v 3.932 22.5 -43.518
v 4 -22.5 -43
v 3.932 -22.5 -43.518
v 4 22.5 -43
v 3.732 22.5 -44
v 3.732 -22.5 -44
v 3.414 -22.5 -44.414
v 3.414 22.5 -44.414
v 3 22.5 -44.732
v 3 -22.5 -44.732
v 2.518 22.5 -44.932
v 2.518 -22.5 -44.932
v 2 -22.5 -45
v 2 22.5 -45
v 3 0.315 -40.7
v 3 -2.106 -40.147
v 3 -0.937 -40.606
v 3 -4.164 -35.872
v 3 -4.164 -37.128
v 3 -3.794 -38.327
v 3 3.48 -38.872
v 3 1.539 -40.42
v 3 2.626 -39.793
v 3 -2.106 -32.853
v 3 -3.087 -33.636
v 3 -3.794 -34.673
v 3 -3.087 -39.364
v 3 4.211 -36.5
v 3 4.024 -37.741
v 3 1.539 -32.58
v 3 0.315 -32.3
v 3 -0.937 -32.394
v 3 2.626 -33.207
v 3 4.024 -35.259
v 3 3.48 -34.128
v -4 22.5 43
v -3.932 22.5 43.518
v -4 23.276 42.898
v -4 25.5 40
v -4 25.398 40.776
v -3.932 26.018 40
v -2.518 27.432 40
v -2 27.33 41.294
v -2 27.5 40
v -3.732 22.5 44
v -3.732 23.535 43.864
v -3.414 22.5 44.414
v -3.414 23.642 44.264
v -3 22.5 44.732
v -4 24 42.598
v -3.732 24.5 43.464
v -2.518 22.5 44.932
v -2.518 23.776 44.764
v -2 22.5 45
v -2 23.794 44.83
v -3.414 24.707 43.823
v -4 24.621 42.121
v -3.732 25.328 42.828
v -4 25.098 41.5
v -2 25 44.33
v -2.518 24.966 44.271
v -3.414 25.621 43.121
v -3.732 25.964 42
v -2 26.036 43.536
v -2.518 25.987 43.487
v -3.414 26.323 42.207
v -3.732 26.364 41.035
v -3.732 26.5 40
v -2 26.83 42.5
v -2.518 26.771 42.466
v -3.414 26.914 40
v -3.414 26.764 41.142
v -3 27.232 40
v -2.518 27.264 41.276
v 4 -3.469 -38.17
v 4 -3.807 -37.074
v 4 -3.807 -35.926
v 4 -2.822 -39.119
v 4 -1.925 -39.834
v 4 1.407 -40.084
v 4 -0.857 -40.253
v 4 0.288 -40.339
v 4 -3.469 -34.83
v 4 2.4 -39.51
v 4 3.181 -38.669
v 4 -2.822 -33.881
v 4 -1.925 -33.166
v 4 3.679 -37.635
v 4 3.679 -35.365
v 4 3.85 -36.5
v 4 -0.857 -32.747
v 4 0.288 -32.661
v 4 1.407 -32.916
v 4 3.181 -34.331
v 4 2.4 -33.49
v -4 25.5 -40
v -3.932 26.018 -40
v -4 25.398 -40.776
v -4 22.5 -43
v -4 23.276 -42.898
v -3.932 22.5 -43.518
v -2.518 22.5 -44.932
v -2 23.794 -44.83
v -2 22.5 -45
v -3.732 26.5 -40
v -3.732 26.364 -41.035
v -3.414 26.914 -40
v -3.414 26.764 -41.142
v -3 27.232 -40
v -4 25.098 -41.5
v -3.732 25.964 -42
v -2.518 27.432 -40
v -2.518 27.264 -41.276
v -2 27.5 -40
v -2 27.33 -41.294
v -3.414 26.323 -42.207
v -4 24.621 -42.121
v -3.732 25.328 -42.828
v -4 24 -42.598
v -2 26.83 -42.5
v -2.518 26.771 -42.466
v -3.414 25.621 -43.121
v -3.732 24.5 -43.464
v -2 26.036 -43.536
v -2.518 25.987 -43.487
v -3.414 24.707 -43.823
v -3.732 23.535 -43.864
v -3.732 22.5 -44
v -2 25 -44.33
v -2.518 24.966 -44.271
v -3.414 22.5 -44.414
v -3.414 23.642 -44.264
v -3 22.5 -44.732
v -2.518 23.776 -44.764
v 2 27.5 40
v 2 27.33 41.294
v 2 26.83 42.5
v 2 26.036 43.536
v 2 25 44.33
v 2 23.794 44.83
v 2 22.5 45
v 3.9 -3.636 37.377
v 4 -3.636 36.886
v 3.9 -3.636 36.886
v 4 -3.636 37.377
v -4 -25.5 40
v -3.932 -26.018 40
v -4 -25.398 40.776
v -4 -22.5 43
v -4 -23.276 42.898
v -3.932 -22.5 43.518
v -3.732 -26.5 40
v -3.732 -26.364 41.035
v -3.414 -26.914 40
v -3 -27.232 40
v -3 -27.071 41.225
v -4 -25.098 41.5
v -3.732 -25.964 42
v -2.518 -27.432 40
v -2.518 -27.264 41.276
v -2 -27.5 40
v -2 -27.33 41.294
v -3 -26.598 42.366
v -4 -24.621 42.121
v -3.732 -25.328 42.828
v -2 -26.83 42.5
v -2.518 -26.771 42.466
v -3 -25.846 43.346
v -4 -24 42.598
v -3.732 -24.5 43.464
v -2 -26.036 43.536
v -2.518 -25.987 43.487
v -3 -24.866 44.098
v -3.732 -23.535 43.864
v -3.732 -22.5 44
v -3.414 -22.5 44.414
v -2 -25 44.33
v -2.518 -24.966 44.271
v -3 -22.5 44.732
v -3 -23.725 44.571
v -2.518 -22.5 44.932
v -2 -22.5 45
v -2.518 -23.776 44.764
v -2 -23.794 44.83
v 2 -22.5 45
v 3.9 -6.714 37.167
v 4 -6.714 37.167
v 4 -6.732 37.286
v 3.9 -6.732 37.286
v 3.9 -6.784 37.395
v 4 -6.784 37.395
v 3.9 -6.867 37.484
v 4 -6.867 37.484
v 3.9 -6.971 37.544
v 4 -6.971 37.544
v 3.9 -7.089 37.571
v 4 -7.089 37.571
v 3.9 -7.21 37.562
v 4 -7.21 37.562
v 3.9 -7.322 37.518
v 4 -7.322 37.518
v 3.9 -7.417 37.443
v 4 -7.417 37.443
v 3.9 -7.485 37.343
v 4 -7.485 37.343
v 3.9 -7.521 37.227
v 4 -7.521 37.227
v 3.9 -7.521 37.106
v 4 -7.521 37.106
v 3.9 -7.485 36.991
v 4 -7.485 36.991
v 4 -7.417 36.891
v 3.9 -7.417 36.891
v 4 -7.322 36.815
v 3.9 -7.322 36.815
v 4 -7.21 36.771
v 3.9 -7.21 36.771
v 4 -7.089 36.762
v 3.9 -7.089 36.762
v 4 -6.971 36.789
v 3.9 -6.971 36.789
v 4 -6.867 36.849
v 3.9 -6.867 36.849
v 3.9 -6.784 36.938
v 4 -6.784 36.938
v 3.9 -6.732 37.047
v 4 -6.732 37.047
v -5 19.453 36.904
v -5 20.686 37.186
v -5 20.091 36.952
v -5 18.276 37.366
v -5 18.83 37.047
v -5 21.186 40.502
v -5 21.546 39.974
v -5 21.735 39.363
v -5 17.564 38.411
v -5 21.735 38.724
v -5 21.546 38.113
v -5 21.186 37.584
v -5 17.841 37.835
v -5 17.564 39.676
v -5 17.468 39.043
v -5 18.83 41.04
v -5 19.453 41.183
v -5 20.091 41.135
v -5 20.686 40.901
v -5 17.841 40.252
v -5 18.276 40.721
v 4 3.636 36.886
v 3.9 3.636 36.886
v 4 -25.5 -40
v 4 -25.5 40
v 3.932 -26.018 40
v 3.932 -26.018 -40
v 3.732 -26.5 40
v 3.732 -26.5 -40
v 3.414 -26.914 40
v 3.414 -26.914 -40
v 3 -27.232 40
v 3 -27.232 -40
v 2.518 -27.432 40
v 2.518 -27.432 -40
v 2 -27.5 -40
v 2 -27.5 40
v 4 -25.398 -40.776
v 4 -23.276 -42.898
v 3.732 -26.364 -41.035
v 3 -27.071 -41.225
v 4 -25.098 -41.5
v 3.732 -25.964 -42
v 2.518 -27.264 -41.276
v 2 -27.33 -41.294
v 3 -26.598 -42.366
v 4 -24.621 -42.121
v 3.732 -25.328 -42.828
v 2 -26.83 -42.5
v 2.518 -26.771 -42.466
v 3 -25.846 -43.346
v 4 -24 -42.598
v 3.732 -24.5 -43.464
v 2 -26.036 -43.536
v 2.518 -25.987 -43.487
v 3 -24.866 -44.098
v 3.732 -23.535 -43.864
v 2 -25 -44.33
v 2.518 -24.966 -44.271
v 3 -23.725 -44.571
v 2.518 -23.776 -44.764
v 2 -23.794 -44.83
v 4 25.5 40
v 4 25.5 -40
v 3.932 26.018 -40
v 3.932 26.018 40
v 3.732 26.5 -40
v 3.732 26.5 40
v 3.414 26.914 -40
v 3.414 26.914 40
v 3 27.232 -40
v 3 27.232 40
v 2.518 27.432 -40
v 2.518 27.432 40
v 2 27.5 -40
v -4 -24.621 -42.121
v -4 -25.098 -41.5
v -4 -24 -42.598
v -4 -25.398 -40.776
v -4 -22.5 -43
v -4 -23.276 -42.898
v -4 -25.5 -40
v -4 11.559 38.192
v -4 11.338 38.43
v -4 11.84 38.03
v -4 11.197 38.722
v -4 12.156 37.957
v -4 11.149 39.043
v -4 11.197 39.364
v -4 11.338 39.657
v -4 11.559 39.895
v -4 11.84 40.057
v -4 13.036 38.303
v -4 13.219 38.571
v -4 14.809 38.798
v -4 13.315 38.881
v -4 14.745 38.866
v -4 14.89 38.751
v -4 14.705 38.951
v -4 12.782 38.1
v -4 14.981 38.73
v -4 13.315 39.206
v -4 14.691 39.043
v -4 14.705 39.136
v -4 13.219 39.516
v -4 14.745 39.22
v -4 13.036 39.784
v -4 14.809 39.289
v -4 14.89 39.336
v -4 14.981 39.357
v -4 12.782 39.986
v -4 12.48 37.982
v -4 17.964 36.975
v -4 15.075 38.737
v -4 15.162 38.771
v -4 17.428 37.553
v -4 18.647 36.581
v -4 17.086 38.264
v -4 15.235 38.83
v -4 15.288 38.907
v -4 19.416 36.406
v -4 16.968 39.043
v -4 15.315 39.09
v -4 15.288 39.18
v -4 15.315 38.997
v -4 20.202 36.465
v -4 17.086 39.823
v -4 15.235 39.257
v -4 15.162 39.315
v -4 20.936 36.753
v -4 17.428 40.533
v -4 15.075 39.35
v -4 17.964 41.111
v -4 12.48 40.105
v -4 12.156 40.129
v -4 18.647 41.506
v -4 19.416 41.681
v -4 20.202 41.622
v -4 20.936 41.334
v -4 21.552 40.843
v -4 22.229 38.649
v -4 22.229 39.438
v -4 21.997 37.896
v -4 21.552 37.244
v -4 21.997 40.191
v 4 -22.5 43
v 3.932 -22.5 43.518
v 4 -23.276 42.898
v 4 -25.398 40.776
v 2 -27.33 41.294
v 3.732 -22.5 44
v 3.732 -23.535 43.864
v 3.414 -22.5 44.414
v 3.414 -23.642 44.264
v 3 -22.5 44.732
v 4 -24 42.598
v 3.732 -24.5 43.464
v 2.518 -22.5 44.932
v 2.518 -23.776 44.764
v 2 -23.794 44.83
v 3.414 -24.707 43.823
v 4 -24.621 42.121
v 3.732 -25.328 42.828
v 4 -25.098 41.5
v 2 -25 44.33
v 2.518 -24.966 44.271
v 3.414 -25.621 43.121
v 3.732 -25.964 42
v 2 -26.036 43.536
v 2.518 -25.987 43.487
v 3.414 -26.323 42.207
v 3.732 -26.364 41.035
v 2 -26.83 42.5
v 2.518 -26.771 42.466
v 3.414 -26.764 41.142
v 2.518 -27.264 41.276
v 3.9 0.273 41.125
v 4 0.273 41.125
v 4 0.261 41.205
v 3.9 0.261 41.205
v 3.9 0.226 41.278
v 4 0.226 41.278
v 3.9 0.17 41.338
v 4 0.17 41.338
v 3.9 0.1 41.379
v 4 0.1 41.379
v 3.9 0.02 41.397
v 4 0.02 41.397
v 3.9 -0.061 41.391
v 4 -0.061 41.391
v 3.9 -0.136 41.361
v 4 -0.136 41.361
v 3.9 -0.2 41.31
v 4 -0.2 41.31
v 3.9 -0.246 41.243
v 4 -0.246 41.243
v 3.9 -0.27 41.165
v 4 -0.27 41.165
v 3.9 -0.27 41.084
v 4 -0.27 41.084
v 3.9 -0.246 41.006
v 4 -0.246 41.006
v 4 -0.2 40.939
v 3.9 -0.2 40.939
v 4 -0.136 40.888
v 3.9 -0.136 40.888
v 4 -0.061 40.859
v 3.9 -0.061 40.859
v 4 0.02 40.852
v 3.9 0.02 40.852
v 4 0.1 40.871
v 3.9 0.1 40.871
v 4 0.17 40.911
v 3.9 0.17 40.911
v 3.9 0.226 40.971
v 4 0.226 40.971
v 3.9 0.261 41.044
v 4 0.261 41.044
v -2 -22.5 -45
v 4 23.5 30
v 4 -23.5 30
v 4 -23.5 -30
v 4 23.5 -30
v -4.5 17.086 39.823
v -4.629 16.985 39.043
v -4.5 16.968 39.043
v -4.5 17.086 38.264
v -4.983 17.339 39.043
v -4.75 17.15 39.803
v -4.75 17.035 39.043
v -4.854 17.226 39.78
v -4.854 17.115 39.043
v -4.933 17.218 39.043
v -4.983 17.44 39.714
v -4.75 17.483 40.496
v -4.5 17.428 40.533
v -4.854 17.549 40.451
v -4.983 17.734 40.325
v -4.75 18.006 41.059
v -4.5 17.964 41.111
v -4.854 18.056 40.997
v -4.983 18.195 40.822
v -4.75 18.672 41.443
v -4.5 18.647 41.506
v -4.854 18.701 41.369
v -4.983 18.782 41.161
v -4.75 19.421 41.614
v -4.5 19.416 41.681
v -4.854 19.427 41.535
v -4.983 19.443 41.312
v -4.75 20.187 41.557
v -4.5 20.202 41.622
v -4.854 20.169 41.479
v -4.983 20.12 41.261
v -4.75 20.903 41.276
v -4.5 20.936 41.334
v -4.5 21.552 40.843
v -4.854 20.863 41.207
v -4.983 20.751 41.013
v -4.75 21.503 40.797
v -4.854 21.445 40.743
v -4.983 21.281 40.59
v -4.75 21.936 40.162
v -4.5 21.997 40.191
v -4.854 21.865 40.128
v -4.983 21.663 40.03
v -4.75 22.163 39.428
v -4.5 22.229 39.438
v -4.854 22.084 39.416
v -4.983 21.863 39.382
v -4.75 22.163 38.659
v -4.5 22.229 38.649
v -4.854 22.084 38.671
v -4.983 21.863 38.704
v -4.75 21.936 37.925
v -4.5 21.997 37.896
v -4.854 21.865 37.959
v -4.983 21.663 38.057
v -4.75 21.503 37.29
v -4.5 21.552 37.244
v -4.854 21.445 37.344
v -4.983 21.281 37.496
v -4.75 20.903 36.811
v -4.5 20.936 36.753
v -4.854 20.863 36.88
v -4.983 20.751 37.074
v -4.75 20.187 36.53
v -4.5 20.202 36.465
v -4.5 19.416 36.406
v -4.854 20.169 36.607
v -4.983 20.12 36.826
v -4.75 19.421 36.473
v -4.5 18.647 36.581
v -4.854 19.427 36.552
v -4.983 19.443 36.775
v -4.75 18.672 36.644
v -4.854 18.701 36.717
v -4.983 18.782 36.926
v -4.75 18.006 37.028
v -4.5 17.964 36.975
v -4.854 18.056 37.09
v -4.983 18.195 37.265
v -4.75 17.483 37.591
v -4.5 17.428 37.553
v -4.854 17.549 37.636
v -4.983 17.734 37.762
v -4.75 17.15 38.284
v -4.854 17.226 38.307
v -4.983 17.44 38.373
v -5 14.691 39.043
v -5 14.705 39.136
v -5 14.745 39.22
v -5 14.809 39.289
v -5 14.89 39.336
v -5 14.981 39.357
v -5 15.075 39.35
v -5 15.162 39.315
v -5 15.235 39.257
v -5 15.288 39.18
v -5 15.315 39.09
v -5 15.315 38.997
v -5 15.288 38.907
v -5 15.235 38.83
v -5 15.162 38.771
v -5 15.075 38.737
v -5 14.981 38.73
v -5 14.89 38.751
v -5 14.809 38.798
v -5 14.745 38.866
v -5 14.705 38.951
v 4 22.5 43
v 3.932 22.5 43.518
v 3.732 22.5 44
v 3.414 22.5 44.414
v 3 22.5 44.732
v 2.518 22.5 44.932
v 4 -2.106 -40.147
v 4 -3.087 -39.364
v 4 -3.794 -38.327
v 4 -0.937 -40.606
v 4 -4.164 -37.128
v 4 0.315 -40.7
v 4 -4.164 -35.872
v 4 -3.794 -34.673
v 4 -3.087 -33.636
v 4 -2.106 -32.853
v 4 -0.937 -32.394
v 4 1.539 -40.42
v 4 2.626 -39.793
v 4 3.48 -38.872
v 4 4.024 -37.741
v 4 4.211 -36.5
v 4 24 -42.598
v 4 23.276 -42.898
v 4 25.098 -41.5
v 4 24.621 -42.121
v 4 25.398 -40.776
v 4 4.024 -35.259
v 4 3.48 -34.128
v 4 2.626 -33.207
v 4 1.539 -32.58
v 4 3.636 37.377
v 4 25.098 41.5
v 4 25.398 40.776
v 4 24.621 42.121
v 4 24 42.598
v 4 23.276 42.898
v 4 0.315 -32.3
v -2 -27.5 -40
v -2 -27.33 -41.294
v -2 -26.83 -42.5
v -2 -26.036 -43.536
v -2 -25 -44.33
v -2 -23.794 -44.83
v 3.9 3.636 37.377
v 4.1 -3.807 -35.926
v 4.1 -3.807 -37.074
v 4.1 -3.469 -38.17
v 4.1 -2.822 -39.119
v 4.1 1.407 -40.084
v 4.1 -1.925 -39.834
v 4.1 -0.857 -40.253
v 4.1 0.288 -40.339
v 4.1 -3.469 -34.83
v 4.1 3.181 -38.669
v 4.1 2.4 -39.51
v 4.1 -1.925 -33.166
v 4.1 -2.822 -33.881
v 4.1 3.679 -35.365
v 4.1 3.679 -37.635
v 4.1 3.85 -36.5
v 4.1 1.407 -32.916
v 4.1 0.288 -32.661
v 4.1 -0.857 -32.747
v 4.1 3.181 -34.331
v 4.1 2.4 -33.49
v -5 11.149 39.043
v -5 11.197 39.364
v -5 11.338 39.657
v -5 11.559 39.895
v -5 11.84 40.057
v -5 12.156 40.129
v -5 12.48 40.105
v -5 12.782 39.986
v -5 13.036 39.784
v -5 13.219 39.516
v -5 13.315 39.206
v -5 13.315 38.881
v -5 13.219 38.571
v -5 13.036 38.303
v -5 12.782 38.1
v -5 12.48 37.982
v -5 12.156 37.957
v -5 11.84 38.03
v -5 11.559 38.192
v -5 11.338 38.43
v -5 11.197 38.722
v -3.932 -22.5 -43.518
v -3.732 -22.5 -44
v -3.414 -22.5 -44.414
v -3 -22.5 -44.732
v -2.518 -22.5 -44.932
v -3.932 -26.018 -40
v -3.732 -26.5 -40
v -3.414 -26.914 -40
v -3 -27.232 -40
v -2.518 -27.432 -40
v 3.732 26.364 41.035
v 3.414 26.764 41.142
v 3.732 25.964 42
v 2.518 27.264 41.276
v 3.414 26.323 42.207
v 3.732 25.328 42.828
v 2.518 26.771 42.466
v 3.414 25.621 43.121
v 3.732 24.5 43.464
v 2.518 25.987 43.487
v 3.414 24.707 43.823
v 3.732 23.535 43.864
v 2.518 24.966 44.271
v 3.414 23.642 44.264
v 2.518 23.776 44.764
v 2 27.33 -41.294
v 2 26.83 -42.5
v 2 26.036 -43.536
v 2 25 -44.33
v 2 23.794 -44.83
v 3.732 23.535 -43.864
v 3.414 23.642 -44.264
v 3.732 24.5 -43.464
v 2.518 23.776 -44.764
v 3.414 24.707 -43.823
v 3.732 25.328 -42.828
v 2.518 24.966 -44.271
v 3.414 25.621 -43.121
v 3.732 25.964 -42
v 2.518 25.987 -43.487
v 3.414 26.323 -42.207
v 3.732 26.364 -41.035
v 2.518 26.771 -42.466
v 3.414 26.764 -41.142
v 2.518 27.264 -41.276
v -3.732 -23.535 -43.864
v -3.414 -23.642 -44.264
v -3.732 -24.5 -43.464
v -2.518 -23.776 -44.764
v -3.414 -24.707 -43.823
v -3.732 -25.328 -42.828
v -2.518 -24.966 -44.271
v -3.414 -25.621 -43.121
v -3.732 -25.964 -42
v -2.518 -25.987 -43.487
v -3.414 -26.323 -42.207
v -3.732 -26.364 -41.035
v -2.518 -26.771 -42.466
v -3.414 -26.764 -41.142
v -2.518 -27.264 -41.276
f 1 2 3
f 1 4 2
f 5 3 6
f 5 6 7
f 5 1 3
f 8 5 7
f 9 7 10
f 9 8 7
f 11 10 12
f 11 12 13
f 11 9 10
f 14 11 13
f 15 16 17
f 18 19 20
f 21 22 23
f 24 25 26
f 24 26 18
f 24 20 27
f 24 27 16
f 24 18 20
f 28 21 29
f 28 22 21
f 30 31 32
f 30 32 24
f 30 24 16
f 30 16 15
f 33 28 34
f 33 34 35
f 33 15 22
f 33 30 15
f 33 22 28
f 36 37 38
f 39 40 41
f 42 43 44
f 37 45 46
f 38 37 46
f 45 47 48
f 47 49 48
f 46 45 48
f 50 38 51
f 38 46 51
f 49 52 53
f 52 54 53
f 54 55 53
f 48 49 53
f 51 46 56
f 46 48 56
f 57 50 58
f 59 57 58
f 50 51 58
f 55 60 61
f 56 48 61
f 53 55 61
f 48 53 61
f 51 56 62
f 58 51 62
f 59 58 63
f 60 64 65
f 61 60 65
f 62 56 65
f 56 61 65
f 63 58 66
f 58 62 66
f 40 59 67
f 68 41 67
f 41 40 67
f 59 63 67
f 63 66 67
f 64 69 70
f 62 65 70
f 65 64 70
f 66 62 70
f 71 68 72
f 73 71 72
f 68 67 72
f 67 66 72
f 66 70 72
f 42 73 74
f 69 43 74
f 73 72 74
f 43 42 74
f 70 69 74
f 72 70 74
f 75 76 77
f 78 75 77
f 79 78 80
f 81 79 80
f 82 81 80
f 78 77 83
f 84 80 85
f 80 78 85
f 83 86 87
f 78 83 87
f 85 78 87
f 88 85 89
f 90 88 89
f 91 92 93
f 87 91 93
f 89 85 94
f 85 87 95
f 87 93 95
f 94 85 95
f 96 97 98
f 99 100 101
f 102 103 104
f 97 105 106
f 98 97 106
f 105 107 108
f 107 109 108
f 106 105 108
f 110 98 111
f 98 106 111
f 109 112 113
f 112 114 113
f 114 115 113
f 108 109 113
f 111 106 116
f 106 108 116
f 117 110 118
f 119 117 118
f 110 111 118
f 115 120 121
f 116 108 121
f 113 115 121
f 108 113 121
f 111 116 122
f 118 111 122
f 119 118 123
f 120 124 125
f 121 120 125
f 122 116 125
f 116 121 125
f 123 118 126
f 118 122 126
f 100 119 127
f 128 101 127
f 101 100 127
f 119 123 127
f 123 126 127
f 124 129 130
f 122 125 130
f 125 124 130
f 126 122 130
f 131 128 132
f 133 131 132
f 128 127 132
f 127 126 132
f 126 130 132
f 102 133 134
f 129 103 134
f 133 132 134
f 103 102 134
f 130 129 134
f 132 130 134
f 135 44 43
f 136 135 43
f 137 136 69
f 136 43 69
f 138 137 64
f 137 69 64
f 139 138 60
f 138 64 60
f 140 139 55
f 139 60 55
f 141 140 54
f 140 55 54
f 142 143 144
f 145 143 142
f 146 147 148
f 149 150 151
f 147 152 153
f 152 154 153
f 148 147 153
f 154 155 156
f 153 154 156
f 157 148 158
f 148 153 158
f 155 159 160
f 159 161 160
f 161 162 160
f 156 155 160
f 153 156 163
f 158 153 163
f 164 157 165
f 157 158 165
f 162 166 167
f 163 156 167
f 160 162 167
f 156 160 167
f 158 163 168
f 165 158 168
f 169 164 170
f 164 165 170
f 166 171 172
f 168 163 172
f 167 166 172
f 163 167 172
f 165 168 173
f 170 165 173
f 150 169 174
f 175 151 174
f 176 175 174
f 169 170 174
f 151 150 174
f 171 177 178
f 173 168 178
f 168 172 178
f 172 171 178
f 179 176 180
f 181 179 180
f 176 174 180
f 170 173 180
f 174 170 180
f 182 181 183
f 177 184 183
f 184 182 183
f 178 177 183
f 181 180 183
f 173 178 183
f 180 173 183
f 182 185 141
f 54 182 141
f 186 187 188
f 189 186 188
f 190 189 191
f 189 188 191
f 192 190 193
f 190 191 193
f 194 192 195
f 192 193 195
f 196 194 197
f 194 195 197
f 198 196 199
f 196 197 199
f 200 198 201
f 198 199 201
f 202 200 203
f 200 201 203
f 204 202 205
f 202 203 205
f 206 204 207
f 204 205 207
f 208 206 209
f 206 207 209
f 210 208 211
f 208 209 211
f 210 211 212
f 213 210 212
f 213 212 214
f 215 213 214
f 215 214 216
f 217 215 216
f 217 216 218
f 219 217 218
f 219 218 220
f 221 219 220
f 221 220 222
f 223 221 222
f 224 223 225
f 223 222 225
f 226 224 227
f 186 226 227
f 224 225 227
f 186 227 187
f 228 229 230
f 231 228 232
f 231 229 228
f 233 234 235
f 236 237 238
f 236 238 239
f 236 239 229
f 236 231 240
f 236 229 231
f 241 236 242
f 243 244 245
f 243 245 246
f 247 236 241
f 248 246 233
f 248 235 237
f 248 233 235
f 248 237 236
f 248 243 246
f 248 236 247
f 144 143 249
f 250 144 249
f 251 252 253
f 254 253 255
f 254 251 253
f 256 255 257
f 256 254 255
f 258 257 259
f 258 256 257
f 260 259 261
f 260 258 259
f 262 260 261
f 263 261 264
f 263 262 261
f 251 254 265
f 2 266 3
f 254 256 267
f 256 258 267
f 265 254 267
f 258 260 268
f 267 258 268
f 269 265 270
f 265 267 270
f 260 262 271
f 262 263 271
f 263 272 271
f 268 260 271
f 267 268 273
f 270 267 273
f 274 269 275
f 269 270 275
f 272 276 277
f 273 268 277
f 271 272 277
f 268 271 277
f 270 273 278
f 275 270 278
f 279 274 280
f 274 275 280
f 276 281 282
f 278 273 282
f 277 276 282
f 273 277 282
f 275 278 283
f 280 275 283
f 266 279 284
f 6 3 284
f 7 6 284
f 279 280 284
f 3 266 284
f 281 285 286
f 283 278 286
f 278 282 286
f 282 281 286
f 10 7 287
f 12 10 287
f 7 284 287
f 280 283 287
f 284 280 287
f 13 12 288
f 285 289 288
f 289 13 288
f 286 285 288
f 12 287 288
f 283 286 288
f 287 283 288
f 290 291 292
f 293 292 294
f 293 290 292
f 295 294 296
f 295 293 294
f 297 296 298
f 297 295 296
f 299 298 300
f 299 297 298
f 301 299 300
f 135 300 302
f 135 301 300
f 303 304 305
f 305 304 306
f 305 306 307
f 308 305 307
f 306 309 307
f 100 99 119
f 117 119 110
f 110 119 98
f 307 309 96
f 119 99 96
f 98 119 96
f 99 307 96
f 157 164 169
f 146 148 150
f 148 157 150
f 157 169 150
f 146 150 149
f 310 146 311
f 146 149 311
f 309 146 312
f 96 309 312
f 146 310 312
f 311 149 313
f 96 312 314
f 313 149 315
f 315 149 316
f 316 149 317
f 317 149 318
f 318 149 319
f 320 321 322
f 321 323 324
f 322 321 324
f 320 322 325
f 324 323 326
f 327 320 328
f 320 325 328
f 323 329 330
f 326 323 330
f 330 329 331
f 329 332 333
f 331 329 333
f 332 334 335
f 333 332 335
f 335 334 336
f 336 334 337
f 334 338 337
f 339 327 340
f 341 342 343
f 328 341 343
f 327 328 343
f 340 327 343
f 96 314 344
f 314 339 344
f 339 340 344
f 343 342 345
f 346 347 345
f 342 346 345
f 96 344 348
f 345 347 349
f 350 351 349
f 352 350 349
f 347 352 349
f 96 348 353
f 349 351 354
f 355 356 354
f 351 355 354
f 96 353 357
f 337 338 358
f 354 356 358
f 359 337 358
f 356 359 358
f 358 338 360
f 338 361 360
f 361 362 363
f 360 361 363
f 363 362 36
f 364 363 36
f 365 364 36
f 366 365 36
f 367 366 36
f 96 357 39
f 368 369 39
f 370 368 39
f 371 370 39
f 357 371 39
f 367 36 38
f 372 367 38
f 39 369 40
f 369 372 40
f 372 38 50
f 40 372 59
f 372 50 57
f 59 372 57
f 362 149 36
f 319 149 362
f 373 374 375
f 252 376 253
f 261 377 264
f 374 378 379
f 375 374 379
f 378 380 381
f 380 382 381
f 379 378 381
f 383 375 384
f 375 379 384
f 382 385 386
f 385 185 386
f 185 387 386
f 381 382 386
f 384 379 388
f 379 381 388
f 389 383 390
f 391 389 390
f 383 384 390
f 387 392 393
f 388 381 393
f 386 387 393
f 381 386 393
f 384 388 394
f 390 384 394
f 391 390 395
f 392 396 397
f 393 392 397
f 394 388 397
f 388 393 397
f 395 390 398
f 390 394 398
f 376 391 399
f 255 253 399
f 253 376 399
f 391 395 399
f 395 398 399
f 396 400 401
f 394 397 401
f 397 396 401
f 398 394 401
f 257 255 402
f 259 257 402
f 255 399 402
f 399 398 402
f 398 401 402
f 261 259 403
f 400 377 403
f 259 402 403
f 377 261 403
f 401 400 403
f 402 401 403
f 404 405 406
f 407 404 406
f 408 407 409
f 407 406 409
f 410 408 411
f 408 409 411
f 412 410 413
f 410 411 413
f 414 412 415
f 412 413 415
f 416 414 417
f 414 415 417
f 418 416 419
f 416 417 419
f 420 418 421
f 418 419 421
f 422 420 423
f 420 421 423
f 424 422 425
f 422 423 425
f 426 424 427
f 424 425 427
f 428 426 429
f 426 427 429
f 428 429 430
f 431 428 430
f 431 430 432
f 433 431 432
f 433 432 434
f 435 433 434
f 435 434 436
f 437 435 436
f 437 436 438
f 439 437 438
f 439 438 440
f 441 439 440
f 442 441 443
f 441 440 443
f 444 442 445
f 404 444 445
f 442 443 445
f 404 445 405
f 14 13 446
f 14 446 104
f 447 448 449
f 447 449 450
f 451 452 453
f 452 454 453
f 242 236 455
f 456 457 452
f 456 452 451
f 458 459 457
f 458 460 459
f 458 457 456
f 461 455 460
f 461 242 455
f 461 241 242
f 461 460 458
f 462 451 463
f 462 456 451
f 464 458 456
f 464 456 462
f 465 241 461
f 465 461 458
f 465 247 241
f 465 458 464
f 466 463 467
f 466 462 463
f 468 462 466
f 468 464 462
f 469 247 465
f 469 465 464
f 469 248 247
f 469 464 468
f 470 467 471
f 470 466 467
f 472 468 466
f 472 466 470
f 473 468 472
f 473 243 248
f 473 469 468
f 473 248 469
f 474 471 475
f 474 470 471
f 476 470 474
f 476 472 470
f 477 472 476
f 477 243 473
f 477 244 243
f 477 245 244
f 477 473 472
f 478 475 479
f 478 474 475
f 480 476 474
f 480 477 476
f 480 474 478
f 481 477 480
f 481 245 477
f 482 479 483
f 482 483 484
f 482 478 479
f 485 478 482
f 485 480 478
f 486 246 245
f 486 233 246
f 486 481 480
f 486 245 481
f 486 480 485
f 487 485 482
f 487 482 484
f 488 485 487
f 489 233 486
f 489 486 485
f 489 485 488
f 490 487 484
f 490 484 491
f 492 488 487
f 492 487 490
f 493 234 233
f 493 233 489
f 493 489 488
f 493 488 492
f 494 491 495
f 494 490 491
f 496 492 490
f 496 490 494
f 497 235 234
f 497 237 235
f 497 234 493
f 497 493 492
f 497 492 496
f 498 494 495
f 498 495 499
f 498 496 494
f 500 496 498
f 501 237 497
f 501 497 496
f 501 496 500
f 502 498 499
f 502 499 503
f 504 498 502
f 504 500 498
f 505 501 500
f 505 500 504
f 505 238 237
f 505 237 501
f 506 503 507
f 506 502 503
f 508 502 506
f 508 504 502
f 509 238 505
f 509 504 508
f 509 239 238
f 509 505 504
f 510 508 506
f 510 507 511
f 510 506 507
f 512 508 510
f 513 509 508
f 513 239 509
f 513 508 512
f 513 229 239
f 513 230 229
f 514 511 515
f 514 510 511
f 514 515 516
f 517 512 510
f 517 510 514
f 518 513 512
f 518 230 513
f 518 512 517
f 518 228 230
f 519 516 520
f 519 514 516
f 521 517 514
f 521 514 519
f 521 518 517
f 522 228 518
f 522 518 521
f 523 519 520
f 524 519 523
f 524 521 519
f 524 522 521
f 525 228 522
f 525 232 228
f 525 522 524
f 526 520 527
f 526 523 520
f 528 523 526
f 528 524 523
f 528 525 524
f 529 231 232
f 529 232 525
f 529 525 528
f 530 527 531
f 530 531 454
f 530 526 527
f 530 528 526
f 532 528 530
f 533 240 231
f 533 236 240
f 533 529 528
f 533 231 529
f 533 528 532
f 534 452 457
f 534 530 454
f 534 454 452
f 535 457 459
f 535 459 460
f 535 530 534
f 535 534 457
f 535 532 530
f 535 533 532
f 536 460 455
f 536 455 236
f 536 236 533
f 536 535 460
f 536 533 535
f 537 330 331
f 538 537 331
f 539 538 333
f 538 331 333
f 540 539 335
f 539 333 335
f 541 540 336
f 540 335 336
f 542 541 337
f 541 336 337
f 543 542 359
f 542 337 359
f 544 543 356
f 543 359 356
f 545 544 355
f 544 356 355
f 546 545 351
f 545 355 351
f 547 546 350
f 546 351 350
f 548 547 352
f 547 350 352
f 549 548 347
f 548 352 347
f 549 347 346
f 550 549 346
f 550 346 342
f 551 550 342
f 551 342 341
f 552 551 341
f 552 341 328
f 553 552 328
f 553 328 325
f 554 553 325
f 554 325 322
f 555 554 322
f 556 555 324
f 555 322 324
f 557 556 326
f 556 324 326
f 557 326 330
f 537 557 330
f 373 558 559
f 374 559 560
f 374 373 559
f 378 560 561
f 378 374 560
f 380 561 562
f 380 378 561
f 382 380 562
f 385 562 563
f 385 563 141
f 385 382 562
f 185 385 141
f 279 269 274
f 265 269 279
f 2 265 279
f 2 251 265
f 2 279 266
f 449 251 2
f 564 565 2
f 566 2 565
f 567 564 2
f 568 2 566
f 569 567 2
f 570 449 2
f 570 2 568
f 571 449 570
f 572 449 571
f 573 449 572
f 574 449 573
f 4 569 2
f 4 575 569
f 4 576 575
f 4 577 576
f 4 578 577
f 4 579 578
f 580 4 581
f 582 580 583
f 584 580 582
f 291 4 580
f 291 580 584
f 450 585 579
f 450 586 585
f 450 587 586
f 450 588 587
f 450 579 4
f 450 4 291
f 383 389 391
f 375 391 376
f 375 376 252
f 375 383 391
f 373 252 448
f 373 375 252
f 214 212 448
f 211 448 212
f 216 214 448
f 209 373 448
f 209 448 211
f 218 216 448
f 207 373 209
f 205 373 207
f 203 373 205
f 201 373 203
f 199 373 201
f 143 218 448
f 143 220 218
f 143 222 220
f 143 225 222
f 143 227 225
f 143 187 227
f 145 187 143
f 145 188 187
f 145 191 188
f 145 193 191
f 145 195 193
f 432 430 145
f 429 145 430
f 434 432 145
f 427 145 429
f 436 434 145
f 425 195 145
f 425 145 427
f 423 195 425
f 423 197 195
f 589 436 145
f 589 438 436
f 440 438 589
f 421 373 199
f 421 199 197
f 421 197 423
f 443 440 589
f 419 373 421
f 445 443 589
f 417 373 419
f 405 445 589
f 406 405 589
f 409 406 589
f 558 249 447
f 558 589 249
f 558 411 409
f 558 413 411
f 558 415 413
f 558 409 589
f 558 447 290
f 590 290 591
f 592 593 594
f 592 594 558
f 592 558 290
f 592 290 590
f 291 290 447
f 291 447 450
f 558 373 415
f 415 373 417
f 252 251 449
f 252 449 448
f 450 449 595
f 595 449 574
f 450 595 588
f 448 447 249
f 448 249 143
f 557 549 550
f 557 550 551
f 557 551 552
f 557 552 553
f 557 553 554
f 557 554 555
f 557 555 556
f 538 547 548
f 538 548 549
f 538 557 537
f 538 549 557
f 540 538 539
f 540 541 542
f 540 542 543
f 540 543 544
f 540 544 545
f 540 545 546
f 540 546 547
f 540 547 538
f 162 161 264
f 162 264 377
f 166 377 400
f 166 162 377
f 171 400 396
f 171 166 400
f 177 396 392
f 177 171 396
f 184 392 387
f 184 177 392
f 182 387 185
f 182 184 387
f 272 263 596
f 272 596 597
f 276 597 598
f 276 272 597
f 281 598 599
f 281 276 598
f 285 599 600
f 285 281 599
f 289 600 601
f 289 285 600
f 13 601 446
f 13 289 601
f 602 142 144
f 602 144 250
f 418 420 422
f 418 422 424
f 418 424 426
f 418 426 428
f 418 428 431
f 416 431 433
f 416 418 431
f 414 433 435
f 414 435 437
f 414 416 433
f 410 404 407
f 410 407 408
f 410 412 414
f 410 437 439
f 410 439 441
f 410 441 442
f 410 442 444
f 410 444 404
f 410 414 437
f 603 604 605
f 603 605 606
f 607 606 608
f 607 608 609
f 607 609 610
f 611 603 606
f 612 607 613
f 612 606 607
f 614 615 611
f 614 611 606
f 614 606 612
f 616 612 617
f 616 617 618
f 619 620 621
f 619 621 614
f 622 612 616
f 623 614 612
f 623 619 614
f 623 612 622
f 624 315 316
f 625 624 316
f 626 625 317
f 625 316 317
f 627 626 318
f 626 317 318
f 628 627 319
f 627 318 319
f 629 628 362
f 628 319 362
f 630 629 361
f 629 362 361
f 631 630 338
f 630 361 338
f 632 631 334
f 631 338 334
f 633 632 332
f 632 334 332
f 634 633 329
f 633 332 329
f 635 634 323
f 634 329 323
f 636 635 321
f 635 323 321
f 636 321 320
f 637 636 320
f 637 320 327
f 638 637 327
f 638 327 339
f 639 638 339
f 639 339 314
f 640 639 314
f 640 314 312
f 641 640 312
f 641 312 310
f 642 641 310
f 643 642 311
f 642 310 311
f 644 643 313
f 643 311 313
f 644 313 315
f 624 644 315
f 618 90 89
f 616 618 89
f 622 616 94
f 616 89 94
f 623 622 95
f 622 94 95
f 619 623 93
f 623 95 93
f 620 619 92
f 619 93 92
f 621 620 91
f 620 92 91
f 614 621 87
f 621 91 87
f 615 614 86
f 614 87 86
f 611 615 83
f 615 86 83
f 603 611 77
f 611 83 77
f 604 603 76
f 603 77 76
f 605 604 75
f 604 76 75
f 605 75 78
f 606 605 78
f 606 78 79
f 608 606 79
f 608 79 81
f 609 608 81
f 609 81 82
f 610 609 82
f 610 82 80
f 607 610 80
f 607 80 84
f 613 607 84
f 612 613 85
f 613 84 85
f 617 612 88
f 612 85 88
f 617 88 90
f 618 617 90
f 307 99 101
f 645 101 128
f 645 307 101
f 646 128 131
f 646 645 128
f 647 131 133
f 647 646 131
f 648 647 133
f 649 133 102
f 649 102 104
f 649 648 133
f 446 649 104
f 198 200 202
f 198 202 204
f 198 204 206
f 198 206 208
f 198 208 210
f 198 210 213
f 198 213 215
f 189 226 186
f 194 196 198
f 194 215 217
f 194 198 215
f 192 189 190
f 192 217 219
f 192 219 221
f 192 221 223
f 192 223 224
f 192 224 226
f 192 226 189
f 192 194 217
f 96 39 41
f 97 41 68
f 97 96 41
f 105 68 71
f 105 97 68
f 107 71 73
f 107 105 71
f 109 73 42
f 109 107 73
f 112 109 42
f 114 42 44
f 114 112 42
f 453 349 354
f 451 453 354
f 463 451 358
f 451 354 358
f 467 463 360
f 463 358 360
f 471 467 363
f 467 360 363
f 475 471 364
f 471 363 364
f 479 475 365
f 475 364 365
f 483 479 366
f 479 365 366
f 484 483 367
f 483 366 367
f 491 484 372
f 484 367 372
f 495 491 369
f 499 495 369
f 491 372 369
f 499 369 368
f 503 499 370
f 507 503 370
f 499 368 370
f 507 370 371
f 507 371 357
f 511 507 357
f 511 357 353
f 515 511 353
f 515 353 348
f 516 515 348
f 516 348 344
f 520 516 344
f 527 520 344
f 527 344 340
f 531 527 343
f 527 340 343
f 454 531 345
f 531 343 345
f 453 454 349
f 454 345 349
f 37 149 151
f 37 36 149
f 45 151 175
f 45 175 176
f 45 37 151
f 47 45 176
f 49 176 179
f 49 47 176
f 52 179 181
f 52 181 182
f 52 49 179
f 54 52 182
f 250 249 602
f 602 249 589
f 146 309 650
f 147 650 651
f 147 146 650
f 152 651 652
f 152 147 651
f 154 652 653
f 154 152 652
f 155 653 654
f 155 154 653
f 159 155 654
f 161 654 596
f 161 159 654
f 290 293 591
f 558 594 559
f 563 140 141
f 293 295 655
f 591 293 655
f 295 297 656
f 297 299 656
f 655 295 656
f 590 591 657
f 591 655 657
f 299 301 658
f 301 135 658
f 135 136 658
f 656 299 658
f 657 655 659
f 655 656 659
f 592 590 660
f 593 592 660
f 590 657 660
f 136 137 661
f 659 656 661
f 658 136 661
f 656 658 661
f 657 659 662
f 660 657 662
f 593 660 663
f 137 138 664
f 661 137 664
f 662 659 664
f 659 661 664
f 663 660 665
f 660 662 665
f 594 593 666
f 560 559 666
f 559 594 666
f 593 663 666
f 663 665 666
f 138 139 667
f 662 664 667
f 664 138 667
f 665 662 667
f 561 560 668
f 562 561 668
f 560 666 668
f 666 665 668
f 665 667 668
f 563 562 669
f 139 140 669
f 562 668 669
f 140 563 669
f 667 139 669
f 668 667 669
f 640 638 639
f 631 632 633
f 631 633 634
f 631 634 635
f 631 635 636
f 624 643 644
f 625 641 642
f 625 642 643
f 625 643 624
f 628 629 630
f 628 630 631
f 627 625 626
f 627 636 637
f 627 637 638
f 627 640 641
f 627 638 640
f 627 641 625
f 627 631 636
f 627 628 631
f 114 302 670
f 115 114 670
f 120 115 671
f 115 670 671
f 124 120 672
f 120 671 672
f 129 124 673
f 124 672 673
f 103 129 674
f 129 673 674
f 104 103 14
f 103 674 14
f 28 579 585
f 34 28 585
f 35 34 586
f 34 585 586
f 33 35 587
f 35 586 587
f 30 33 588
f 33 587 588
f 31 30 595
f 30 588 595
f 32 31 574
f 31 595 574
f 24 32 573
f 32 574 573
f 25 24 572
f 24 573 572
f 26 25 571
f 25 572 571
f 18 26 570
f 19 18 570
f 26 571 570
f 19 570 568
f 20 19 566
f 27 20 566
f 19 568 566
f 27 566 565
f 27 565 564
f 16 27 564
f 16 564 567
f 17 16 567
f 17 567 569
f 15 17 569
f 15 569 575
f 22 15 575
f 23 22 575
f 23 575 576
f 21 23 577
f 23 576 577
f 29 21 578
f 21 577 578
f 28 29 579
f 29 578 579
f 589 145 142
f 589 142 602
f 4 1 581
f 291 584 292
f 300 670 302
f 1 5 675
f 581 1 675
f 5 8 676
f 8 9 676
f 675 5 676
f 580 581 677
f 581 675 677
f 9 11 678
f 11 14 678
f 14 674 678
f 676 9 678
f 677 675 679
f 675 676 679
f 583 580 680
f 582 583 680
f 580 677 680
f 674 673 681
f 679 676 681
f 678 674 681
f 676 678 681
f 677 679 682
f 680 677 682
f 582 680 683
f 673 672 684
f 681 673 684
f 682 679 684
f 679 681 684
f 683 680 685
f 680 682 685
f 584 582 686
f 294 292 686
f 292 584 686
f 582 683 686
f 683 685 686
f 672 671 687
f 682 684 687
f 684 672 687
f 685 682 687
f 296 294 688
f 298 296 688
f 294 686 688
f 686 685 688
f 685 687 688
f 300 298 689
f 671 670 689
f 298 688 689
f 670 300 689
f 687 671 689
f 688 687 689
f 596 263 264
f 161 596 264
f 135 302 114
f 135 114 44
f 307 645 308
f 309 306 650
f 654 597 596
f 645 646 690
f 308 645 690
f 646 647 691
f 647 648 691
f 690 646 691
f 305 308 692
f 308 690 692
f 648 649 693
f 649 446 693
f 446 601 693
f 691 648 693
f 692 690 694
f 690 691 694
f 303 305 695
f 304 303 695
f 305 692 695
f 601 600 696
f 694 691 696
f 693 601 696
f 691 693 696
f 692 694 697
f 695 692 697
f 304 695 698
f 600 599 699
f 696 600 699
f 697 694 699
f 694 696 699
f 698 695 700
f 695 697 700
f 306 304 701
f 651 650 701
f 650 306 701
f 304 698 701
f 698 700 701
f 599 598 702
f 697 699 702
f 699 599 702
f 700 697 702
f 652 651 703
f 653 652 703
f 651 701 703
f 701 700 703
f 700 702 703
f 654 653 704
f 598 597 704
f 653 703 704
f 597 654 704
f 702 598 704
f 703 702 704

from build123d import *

# Parameters (mm, degrees)
F0_W      = 55
F0_H      = 90
F1_DEPTH  = 4
F2_R      = 5
F3_R      = 2
F4_R      = 4.211377
F5_DEPTH  = 1
F6_R      = 3.85
F7_DEPTH  = 0.1
F8_W      = 7.27267
F8_H      = 0.490911
F9_DEPTH  = 0.1
F10_R     = 0.405738
F11_DEPTH = 0.1
F12_R     = 0.272961
F13_DEPTH = 0.1
F4_W      = 47
F4_H      = 60
F14_DEPTH = 0.0001
F16_R     = 2.64509
F16_R_2   = 0.314137
F16_R_3   = 1.088967
F17_DEPTH = 1
F18_R     = 0.5


with BuildPart() as f1:
    # F0 (on Right) → F1 (new body, symmetric)
    with BuildSketch(Plane.YZ):
        Rectangle(F0_W, F0_H)
    extrude(amount=F1_DEPTH, both=True)

    # F2
    f2_edges = [f1.edges().sort_by_distance(p)[0] for p in [
        (0, -27.5, 45),
        (0, -27.5, -45),
        (0, 27.5, 45),
        (0, 27.5, -45),
    ]]
    fillet(f2_edges, radius=F2_R)

    # F3
    f3_edges = [f1.edges().sort_by_distance(p)[0] for p in [
        (4, 0, -45),
        (-4, 0, 45),
    ]]
    fillet(f3_edges, radius=F3_R)

    # F4 (on face) → F5 (cut)
    with BuildSketch(Plane.YZ.offset(4)):
        with Locations((0, -36.5)):
            Circle(F4_R)
    extrude(amount=-F5_DEPTH, mode=Mode.SUBTRACT)

    # F8 (on face) → F9 (cut)
    with BuildSketch(Plane.YZ.offset(4)):
        with Locations((0, 37.131108)):
            Rectangle(F8_W, F8_H)
    extrude(amount=-F9_DEPTH, mode=Mode.SUBTRACT)

    # F10 (on face) → F11 (cut)
    with BuildSketch(Plane.YZ.offset(4)):
        with Locations((-7.119562, 37.166573)):
            Circle(F10_R)
    extrude(amount=-F11_DEPTH, mode=Mode.SUBTRACT)

    # F12 (on face) → F13 (cut)
    with BuildSketch(Plane.YZ.offset(4)):
        with Locations((0, 41.124657)):
            Circle(F12_R)
    extrude(amount=-F13_DEPTH, mode=Mode.SUBTRACT)

    # F4 (on face) → F14 (cut)
    with BuildSketch(Plane.YZ.offset(4)):
        Rectangle(F4_W, F4_H)
    extrude(amount=-F14_DEPTH, mode=Mode.SUBTRACT)

    # F16 (on face) → F17 (join)
    with BuildSketch(Plane(origin=(-4, 0, 0), x_dir=(0, -1, 0), z_dir=(-1, 0, 0))):
        with Locations((-19.613449, 39.043419)):
            Circle(F16_R)
        with Locations((-15.004834, 39.043419)):
            Circle(F16_R_2)
        with Locations((-12.237698, 39.043419)):
            Circle(F16_R_3)
    extrude(amount=F17_DEPTH)

    # F18
    f18_edges = [f1.edges().sort_by_distance(p)[0] for p in [
        (-5, 22.258539, 39.043419),
    ]]
    fillet(f18_edges, radius=F18_R)


with BuildPart() as f7:
    # F6 (on face) → F7 (new body)
    with BuildSketch(Plane.YZ.offset(4)):
        with Locations((0, -36.5)):
            Circle(F6_R)
    extrude(amount=F7_DEPTH)


solid = Compound([f1.part, f7.part])
